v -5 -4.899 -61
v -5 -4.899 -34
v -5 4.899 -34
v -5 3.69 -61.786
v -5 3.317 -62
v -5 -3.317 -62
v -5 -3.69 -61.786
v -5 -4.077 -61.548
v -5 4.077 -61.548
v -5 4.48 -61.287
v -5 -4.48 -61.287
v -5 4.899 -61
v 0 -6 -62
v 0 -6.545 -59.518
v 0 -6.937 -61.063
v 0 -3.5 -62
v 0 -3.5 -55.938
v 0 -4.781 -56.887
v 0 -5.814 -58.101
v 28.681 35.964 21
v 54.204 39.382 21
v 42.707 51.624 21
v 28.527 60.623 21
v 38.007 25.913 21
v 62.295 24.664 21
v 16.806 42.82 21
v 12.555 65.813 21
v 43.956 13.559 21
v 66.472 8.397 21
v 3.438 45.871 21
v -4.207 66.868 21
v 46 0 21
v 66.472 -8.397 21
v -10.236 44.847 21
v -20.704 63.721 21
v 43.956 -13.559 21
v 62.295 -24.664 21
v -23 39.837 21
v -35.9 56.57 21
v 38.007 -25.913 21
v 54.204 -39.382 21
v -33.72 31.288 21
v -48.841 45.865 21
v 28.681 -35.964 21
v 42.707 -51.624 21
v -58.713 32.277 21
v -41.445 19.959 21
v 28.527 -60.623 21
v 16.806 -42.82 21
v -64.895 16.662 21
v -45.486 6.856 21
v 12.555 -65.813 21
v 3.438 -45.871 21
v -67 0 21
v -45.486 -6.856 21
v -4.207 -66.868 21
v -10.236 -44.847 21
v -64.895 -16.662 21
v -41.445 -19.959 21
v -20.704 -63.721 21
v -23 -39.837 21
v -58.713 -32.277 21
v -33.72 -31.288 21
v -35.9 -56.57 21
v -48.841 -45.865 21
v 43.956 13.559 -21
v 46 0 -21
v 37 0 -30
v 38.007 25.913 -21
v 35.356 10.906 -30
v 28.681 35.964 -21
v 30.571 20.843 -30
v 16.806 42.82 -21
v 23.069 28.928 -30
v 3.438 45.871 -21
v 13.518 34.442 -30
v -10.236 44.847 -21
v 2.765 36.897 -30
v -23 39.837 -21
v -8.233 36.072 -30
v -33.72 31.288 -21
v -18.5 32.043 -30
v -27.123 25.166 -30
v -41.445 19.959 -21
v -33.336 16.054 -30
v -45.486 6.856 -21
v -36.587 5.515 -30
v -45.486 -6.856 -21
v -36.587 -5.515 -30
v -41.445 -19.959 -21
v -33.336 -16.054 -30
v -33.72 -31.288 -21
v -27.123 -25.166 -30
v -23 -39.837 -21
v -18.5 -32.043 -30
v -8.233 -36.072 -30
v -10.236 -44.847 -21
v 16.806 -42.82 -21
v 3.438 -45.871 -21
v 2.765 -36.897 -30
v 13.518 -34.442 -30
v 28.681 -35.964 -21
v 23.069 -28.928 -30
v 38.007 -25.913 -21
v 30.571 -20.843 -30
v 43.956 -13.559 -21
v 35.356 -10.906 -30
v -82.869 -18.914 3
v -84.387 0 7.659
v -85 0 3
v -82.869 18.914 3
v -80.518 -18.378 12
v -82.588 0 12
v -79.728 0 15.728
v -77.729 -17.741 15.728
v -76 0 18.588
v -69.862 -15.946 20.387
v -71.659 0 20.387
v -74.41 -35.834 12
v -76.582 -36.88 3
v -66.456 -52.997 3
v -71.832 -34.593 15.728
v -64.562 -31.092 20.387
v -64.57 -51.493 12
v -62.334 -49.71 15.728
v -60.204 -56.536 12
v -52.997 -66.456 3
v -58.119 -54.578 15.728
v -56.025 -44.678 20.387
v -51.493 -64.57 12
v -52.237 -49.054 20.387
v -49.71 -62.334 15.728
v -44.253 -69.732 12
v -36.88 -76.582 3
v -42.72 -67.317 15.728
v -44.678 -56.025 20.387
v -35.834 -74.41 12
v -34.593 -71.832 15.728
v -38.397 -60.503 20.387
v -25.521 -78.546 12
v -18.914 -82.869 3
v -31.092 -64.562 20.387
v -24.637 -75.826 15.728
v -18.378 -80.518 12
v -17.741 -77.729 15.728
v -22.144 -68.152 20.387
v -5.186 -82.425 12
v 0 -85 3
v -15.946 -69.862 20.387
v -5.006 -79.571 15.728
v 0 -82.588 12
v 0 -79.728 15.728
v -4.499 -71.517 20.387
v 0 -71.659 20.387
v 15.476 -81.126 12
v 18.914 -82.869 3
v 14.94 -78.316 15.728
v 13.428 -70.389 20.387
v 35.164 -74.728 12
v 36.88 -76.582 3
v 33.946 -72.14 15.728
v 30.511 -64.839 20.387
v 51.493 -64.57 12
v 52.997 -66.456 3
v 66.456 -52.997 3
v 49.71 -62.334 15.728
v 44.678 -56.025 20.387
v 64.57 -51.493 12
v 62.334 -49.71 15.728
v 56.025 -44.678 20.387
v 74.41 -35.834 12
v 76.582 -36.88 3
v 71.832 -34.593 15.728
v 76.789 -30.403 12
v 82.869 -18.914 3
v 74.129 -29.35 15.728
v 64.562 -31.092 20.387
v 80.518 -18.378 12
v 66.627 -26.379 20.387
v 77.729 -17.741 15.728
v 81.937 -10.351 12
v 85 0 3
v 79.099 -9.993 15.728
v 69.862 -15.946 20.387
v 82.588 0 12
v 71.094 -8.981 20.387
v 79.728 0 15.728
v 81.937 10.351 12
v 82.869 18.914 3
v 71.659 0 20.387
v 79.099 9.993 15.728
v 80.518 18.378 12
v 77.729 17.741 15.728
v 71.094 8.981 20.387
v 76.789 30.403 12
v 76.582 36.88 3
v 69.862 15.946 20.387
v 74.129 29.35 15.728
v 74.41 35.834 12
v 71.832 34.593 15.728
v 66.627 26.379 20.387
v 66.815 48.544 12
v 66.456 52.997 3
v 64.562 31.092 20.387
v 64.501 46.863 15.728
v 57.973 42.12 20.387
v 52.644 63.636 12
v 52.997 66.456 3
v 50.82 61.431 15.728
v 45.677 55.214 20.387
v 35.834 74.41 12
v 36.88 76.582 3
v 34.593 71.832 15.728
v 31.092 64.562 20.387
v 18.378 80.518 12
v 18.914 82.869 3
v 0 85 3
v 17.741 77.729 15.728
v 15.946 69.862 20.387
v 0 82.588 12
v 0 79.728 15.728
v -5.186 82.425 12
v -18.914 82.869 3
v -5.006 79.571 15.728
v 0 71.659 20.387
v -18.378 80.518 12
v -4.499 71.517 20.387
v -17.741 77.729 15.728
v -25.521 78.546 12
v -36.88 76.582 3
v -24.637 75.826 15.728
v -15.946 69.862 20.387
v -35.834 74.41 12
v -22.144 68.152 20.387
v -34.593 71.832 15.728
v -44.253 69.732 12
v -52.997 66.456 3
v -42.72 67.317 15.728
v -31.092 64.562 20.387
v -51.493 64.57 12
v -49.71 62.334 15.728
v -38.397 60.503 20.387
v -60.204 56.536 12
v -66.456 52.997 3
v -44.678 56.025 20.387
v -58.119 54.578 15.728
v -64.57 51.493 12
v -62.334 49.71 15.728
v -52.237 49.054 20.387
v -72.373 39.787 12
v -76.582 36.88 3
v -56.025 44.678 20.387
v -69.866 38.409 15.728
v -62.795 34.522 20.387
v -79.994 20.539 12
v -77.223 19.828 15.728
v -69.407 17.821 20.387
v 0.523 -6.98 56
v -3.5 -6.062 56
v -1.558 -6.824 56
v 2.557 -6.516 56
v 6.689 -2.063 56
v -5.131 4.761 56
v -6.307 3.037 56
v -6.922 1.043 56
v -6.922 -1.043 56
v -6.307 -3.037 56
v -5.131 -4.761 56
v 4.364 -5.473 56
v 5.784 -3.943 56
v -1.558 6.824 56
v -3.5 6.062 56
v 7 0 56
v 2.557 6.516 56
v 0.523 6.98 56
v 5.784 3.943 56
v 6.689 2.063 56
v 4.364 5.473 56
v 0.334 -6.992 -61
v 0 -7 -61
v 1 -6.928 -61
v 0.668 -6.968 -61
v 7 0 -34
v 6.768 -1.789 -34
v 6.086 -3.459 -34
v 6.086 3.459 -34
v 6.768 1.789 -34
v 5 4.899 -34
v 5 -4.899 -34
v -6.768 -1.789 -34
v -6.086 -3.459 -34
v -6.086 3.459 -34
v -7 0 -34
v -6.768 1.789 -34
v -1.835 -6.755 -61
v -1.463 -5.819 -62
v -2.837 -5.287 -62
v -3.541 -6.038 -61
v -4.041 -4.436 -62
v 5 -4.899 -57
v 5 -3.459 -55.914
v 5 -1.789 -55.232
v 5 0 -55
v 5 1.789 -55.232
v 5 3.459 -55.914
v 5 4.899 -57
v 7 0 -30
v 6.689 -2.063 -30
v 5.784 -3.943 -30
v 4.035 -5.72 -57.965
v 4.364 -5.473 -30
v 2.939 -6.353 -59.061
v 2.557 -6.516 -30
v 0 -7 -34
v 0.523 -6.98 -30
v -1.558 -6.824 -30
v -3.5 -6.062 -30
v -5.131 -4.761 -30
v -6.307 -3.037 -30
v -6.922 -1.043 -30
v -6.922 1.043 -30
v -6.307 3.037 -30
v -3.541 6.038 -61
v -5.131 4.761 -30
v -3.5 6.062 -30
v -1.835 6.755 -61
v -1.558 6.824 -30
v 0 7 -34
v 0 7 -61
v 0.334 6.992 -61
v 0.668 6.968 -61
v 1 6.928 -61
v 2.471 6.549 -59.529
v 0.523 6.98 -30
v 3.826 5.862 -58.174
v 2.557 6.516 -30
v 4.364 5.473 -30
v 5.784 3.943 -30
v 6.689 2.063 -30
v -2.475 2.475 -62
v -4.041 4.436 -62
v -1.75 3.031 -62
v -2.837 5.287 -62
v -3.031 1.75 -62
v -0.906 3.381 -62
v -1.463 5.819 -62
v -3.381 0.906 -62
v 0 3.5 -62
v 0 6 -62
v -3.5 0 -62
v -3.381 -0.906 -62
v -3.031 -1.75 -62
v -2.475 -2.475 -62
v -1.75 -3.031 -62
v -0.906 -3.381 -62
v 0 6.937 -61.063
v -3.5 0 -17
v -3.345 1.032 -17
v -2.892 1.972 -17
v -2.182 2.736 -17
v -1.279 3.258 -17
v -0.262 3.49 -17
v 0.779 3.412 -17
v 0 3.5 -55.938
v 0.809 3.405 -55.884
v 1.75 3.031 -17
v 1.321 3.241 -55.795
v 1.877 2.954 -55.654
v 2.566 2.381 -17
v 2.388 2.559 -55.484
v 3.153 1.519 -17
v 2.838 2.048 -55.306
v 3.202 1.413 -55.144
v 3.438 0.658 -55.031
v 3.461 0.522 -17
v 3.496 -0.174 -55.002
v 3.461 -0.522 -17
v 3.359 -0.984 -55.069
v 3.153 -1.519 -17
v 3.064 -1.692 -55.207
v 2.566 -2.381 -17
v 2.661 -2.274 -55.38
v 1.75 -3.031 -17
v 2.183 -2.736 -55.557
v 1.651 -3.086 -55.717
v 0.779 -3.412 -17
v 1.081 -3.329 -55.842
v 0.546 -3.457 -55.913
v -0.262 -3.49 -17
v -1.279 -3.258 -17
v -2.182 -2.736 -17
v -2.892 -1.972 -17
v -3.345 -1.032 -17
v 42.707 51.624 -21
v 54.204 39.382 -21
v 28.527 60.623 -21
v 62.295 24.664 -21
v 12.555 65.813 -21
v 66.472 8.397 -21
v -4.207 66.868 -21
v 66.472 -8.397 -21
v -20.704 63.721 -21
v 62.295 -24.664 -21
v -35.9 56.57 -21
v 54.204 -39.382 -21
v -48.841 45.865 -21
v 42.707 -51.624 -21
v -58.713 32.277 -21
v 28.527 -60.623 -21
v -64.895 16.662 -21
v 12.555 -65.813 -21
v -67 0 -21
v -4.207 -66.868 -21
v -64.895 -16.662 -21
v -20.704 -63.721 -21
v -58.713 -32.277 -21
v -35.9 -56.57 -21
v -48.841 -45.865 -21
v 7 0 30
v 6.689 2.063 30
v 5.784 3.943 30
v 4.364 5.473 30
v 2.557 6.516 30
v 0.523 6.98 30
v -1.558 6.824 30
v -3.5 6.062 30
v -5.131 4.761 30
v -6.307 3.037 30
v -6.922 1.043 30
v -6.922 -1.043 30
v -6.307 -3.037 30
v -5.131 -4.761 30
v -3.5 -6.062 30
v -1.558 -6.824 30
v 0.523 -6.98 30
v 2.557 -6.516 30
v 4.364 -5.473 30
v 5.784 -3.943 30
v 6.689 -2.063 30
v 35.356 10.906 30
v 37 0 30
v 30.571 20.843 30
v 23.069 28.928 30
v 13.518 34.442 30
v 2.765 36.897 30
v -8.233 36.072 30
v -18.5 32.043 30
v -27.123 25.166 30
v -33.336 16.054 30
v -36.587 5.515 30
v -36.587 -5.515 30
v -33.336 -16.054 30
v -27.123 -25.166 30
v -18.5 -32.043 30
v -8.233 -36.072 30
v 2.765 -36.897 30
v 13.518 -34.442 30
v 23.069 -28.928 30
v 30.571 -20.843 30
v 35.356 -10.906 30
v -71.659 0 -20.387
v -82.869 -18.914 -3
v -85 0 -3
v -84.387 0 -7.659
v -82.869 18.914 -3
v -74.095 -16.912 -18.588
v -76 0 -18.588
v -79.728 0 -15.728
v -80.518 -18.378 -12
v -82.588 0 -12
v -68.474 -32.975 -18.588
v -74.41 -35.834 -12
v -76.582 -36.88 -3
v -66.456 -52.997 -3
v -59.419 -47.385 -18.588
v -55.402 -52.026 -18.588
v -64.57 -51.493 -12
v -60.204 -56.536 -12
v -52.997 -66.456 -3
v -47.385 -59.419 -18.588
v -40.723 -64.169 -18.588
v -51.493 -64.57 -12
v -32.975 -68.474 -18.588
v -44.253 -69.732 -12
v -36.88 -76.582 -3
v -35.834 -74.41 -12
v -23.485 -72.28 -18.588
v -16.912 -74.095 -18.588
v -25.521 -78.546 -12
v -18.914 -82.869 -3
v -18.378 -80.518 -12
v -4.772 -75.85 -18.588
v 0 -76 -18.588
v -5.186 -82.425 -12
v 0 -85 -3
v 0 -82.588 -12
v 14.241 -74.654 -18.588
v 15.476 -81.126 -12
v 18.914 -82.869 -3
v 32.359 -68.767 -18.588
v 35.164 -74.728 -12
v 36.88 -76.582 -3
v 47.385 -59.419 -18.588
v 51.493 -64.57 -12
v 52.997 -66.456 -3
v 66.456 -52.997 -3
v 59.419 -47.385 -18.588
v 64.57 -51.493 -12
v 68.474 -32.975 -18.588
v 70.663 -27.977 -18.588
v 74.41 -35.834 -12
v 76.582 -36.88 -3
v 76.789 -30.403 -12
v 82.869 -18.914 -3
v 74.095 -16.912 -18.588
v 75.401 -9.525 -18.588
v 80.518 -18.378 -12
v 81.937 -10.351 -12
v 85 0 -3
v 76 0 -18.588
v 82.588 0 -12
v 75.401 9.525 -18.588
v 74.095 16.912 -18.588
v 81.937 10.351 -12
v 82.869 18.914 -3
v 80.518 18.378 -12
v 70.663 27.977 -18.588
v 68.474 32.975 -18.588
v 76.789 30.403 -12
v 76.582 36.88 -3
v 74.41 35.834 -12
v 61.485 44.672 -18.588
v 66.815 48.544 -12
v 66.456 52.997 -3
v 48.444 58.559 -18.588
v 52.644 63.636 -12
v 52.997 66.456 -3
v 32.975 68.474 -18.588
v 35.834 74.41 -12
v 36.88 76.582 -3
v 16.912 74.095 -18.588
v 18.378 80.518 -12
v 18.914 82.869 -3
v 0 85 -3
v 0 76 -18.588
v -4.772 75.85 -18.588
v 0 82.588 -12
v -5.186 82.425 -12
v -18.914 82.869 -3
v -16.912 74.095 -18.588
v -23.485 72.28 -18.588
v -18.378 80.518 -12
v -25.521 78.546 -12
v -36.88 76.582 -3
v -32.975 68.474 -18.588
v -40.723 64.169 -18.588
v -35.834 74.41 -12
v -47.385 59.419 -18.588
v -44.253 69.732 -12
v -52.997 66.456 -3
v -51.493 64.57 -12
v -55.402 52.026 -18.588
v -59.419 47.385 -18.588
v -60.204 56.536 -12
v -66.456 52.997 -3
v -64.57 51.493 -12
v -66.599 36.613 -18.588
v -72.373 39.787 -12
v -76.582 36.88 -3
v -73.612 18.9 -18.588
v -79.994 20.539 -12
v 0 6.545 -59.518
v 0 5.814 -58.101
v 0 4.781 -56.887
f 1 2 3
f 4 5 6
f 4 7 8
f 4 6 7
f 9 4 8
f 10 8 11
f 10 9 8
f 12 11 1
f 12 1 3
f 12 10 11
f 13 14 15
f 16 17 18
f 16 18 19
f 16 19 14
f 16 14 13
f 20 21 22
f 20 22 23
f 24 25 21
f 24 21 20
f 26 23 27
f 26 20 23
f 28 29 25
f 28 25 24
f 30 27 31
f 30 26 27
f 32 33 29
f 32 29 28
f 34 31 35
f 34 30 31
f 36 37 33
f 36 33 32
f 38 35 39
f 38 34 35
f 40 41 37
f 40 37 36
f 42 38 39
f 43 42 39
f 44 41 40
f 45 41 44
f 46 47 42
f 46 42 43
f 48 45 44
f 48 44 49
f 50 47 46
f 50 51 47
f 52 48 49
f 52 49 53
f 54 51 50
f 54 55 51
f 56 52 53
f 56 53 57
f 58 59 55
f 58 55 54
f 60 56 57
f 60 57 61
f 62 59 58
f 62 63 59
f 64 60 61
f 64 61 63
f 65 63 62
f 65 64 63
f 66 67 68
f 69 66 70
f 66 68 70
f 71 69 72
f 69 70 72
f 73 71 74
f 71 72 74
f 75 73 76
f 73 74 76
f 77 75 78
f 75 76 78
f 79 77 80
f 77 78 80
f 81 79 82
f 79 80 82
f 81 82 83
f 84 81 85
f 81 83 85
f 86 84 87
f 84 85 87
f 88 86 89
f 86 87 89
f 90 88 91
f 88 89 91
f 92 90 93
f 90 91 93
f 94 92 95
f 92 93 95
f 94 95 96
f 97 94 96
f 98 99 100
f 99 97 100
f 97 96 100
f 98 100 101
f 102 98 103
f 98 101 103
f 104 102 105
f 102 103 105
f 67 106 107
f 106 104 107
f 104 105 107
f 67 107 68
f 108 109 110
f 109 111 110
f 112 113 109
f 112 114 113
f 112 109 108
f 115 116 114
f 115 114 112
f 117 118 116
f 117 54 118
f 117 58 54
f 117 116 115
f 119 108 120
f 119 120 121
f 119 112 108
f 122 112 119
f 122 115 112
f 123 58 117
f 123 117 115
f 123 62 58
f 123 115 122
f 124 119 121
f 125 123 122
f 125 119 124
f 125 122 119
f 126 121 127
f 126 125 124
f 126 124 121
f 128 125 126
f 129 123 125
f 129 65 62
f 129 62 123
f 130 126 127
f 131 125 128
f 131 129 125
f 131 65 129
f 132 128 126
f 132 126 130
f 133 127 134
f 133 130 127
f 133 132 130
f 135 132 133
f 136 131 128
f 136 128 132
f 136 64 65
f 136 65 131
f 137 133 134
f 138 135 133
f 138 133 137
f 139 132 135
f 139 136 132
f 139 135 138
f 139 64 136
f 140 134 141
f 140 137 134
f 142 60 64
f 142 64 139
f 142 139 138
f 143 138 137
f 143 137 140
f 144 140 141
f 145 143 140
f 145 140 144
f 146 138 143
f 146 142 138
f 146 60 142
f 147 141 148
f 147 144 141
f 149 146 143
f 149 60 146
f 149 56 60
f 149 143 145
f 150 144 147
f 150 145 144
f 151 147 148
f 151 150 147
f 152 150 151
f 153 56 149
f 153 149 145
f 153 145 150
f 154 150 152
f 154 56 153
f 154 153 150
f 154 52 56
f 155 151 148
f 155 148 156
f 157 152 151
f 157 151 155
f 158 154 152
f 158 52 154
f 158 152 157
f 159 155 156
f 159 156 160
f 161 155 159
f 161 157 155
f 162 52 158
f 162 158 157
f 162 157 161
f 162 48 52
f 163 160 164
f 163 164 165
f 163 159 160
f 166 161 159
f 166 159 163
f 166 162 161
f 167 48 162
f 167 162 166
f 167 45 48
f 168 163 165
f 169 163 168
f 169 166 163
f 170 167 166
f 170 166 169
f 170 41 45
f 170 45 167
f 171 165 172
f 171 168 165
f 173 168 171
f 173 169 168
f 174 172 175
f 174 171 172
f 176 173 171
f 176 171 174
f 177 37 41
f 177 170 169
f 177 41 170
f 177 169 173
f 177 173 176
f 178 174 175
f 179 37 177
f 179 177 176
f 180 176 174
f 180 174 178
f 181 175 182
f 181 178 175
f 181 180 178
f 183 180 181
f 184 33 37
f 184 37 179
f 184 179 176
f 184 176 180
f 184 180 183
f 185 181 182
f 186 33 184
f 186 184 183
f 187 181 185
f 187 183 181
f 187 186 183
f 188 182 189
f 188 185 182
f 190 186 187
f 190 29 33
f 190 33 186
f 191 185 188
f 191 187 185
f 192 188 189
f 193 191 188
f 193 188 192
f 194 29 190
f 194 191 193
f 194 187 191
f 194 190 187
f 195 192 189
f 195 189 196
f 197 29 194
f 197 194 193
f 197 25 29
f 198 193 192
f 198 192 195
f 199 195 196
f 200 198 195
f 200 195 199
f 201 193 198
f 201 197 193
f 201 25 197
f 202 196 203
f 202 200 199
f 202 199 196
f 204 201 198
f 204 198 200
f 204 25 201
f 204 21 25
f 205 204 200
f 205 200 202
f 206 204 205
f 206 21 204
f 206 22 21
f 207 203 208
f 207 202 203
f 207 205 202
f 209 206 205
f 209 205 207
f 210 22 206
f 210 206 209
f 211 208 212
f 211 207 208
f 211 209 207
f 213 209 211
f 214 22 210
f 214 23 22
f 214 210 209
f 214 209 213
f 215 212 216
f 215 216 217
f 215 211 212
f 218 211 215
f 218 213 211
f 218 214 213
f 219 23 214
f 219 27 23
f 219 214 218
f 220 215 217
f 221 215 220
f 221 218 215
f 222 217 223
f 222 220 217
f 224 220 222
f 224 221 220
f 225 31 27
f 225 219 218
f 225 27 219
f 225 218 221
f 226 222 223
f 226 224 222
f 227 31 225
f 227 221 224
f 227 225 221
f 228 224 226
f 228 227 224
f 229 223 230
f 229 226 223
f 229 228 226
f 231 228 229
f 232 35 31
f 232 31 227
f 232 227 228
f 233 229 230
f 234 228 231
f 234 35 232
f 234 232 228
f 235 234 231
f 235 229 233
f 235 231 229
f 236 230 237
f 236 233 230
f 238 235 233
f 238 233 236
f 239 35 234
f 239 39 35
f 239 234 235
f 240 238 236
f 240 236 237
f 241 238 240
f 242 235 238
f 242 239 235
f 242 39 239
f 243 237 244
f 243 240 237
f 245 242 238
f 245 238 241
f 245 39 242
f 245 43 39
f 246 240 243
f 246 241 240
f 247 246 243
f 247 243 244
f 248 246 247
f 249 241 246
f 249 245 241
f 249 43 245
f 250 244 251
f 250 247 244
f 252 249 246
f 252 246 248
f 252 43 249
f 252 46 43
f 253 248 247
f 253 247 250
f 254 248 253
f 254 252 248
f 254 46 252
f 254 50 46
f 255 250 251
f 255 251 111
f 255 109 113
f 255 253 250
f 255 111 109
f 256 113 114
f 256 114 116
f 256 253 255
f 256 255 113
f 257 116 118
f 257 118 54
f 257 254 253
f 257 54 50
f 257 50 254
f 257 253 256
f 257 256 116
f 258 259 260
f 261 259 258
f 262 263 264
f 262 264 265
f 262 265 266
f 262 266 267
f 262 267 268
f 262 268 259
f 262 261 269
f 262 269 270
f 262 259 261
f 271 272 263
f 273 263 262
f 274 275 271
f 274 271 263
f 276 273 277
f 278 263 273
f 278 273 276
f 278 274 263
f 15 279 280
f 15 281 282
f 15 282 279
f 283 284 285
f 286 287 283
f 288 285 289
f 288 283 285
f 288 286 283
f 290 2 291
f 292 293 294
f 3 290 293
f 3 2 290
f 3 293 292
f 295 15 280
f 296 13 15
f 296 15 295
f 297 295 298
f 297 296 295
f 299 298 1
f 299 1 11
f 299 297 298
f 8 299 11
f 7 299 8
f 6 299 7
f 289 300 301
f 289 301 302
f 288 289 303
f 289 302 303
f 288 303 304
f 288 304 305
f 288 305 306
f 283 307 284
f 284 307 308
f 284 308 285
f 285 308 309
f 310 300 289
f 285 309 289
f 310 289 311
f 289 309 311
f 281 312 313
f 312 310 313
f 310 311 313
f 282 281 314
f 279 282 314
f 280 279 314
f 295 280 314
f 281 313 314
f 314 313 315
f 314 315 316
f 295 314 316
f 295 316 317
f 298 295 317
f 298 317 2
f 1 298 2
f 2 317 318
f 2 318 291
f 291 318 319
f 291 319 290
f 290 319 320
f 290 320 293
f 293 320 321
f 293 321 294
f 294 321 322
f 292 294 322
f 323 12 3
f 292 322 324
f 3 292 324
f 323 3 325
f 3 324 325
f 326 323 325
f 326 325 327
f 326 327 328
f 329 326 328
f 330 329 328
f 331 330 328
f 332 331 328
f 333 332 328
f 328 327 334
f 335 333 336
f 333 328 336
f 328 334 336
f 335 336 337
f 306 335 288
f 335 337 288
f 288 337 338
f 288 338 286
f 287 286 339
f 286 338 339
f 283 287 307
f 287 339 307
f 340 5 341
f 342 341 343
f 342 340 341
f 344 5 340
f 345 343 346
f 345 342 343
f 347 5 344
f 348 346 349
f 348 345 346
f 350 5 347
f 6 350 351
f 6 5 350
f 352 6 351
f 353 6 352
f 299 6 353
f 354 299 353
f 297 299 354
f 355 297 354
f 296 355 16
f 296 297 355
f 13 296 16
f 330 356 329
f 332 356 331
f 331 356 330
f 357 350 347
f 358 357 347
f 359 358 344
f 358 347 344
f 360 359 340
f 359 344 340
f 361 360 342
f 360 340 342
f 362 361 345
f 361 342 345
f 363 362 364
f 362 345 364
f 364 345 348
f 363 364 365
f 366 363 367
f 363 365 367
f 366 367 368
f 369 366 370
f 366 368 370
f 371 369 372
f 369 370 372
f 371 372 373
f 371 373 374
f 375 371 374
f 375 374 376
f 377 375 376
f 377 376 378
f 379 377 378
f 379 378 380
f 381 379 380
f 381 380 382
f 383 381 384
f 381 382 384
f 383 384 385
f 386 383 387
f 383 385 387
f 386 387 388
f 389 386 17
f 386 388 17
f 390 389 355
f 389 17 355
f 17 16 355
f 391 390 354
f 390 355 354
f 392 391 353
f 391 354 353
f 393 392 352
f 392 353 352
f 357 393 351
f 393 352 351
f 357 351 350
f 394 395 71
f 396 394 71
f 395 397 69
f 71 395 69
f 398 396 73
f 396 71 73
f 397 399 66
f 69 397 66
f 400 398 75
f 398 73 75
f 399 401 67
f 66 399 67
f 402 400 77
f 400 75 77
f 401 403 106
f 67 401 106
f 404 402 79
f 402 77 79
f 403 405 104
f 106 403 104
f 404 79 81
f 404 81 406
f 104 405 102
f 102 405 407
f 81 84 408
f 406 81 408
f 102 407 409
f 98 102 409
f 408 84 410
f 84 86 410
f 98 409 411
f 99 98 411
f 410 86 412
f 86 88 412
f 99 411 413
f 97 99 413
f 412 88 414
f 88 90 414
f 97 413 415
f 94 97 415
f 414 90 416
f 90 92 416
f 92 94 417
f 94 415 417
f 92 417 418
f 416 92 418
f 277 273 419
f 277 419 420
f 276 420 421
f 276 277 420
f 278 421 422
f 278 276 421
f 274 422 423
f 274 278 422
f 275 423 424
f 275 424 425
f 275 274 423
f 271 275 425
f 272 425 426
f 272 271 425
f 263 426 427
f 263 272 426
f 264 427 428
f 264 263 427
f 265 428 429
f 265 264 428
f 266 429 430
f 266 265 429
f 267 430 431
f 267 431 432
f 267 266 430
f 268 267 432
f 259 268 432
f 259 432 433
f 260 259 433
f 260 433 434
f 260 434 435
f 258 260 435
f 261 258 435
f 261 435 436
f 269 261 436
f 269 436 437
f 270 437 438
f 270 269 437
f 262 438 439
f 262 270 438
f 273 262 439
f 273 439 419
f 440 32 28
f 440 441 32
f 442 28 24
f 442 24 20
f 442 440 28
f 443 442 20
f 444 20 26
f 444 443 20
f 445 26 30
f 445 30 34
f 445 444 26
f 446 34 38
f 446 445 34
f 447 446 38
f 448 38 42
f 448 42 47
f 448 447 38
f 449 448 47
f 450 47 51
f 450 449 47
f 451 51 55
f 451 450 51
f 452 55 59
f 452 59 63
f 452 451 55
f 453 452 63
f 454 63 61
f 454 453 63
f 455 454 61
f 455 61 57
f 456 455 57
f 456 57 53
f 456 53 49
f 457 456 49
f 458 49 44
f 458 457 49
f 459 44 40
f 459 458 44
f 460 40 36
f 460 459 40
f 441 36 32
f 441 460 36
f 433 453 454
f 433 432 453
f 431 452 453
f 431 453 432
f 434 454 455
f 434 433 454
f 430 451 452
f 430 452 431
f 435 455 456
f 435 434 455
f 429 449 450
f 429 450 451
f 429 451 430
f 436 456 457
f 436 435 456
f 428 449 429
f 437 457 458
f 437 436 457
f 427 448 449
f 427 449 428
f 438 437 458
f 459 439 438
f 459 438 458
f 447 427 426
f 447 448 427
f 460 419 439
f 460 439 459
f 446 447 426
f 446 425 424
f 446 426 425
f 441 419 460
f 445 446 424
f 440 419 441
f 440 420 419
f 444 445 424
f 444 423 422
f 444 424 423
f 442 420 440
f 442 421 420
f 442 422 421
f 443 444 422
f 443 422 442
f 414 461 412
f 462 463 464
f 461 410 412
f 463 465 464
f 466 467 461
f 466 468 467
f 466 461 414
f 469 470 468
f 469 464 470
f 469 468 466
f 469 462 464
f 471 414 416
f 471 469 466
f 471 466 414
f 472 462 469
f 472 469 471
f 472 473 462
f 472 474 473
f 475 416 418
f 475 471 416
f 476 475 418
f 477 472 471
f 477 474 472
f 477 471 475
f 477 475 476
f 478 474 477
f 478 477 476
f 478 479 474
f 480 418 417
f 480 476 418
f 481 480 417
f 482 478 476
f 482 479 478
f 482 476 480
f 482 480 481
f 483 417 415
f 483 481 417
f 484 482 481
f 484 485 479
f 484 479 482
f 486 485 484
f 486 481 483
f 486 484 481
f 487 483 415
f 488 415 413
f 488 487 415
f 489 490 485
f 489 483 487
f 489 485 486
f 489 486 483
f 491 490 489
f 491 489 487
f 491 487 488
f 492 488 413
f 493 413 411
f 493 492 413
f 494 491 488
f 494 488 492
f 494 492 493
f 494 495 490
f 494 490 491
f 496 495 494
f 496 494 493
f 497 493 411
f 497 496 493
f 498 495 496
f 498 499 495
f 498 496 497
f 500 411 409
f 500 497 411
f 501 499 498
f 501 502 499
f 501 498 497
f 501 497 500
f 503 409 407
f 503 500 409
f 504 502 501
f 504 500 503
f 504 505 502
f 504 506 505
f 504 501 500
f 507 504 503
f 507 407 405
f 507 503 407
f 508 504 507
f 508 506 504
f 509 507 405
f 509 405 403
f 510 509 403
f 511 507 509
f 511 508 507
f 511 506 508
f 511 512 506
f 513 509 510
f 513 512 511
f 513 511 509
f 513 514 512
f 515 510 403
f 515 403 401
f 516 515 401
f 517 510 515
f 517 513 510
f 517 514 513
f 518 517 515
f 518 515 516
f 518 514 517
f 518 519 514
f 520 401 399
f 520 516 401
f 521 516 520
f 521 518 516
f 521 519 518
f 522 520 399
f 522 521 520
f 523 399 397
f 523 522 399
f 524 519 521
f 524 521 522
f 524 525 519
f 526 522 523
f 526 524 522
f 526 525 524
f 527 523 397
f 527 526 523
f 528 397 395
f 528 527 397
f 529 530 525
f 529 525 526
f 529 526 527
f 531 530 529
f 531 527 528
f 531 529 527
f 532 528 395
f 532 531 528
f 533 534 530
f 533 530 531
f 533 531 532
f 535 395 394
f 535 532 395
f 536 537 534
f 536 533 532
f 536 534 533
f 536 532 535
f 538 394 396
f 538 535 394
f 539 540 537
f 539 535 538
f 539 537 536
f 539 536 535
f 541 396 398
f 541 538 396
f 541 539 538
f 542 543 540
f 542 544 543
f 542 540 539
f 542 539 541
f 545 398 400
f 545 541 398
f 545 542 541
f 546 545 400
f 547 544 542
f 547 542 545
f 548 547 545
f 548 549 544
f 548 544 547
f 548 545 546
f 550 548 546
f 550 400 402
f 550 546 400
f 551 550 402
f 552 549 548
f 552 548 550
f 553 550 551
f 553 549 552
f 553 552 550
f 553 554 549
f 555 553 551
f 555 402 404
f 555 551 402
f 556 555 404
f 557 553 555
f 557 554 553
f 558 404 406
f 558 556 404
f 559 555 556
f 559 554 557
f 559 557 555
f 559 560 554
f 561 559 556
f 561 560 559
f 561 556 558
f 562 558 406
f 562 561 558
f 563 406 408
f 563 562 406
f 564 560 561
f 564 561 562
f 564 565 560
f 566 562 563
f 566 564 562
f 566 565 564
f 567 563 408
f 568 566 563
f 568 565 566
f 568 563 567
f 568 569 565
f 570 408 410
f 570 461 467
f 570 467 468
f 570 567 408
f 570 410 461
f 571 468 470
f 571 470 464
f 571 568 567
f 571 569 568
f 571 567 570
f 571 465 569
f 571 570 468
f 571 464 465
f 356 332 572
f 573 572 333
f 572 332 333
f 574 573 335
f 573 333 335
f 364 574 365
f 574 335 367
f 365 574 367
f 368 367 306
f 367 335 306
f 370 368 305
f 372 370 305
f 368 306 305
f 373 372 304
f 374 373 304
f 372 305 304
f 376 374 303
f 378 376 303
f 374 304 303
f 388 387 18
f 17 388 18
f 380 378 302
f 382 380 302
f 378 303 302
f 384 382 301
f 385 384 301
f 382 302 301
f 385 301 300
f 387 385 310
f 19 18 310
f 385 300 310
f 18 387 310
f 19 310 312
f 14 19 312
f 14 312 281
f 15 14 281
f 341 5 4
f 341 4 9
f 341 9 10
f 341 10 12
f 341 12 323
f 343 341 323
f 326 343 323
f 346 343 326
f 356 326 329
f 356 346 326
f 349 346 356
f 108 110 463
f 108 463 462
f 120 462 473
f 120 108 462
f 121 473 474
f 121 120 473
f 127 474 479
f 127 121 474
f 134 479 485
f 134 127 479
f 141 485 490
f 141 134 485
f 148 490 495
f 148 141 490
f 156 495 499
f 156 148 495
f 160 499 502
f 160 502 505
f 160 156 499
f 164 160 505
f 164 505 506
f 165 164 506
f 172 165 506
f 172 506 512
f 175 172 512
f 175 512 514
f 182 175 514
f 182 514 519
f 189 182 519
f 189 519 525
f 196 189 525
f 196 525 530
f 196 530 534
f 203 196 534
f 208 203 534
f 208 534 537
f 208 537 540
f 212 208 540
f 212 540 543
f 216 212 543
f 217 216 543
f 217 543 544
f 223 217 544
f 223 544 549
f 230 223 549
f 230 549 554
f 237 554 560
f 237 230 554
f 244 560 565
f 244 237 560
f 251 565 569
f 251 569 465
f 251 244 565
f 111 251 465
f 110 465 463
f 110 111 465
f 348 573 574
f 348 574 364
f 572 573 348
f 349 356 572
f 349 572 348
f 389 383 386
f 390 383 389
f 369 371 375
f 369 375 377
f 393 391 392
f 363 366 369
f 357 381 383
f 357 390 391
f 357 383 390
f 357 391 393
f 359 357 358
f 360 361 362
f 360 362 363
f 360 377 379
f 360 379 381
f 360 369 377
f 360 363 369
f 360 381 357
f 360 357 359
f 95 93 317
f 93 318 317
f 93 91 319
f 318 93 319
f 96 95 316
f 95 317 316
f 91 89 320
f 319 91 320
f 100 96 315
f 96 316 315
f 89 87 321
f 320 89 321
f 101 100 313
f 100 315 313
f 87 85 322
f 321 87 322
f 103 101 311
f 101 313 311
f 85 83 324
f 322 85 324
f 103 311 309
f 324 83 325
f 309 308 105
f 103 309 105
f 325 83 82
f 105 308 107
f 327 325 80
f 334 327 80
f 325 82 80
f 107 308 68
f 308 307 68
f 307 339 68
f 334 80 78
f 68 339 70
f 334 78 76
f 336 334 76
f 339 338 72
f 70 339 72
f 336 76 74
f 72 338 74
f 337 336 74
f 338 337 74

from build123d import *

# Parameters (mm, degrees)
SKETCH_1_R           = 85
EXTRUDE_1_DEPTH      = 21
SKETCH_2_R           = 47
EXTRUDE_2_DEPTH      = 30
CHAMFER_1_SIZE       = 10
SKETCH_3_R           = 7
EXTRUDE_3_DEPTH      = 32
SKETCH_5_OUTSIDE_W   = 223.484
SKETCH_5_OUTSIDE_H   = 223.484
SKETCH_5_OUTSIDE_W_2 = 10
SKETCH_5_OUTSIDE_H_2 = 14
CUT_EXTRUDE_1_DEPTH  = 28
CHAMFER_3_SIZE       = 1
SKETCH_7_R           = 3.5
CUT_EXTRUDE_2_DEPTH  = 45
SKETCH_8_R           = 7
CUT_EXTRUDE_4_DEPTH  = 5
FILLET_1_R           = 18
EXTRUDE_START        = 26
SKETCH_10_R          = 7
EXTRUDE_4_DEPTH      = 26


with BuildPart() as part:
    # 草图1 → 凸台-拉伸1 (new, symmetric)
    with BuildSketch(Plane.XY):
        with Locations(Location((0, 0, 0), (0, 0, 180))):
            Circle(SKETCH_1_R)
    extrude(amount=EXTRUDE_1_DEPTH, both=True)

    # 草图2 → 凸台-拉伸2 (add, symmetric)
    with BuildSketch(Plane.XY):
        Circle(SKETCH_2_R)
    extrude(amount=EXTRUDE_2_DEPTH, both=True)

    # 倒角1
    # the kernel refuses this chamfer: 10 mm, written as the material it takes off along each edge
    with BuildSketch(Plane(origin=(0, 0, -30), x_dir=(1, 0, 0), z_dir=(0, -1, 0))) as chamfer_1_piece_1_section:
        Polygon((47, CHAMFER_1_SIZE), (47 - CHAMFER_1_SIZE, 0), (47, 0), align=None)
    chamfer_1_piece_1 = revolve(axis=Axis((0, 0, -30), (0, 0, 1)), mode=Mode.PRIVATE)
    chamfer_1_piece_1 = split(chamfer_1_piece_1, bisect_by=Plane(origin=(-41.532222796, 0, -21), z_dir=(0, 0, -1)), keep=Keep.TOP, mode=Mode.PRIVATE)
    add(chamfer_1_piece_1, mode=Mode.SUBTRACT)
    with BuildSketch(Plane(origin=(0, 0, 30), x_dir=(1, 0, 0), z_dir=(0, -1, 0))) as chamfer_1_piece_2_section:
        Polygon((47, -CHAMFER_1_SIZE), (47 - CHAMFER_1_SIZE, 0), (47, 0), align=None)
    chamfer_1_piece_2 = revolve(axis=Axis((0, 0, 30), (0, 0, 1)), mode=Mode.PRIVATE)
    chamfer_1_piece_2 = split(chamfer_1_piece_2, bisect_by=Plane(origin=(-41.532222796, 0, 21), z_dir=(0, 0, 1)), keep=Keep.TOP, mode=Mode.PRIVATE)
    add(chamfer_1_piece_2, mode=Mode.SUBTRACT)

    # 草图3 → 凸台-拉伸3 (add)
    with BuildSketch(Plane(origin=(0, 0, -30), x_dir=(-1, 0, 0), z_dir=(0, 0, -1))):
        with Locations(Location((0, 0, 0), (0, 0, 180))):
            Circle(SKETCH_3_R)
    extrude(amount=EXTRUDE_3_DEPTH)

    # 草图5 outside → 切除-拉伸1 (cut)
    with BuildSketch(Plane(origin=(0, 0, -62), x_dir=(-1, 0, 0), z_dir=(0, 0, -1))):
        Rectangle(SKETCH_5_OUTSIDE_W, SKETCH_5_OUTSIDE_H)
        Rectangle(SKETCH_5_OUTSIDE_W_2, SKETCH_5_OUTSIDE_H_2, mode=Mode.SUBTRACT)
    extrude(amount=-CUT_EXTRUDE_1_DEPTH, mode=Mode.SUBTRACT)

    # 倒角3
    # the kernel refuses this chamfer: 1 mm, written as the material it takes off along each edge
    with BuildSketch(Plane(origin=(0, 0, -62), x_dir=(-0.9180065533872216, 0.39656521271805273, 0), z_dir=(-0.39656521271805273, -0.9180065533872216, 0))) as chamfer_3_piece_1:
        Polygon((7, -CHAMFER_3_SIZE), (7 - CHAMFER_3_SIZE, 0), (7, 0), align=None)
    revolve(axis=Axis((0, 0, -62), (0, 0, -1)), revolution_arc=66.636371816, mode=Mode.SUBTRACT)
    with BuildSketch(Plane(origin=(0, 0, -62), x_dir=(0.9180065533873013, -0.3965652127178682, 0), z_dir=(0.3965652127178682, 0.9180065533873013, 0))) as chamfer_3_piece_2:
        Polygon((7, -CHAMFER_3_SIZE), (7 - CHAMFER_3_SIZE, 0), (7, 0), align=None)
    revolve(axis=Axis((0, 0, -62), (0, 0, -1)), revolution_arc=66.636371927, mode=Mode.SUBTRACT)
    with BuildSketch(Plane(origin=(0, 0, -62), x_dir=(-1.935452947399645e-09, -1.0, 0), z_dir=(1.0, -1.935452947399645e-09, 0))) as chamfer_3_piece_3:
        Polygon((7, -CHAMFER_3_SIZE), (7 - CHAMFER_3_SIZE, 0), (7, 0), align=None)
    revolve(axis=Axis((0, 0, -62), (0, 0, -1)), revolution_arc=66.636371706, mode=Mode.SUBTRACT)
    with BuildSketch(Plane(origin=(0, 0, -62), x_dir=(0, 1, 0), z_dir=(-1, 0, 0))) as chamfer_3_piece_4:
        Polygon((7, -CHAMFER_3_SIZE), (7 - CHAMFER_3_SIZE, 0), (7, 0), align=None)
    revolve(axis=Axis((0, 0, -62), (0, 0, -1)), revolution_arc=66.636371816, mode=Mode.SUBTRACT)

    # 草图7 → 切除-拉伸2 (cut)
    with BuildSketch(Plane(origin=(0, 0, -62), x_dir=(-1, 0, 0), z_dir=(0, 0, -1))):
        Circle(SKETCH_7_R)
    extrude(amount=-CUT_EXTRUDE_2_DEPTH, mode=Mode.SUBTRACT)

    # 草图8 → 切除-拉伸4 (cut)
    with BuildSketch(Plane(origin=(5, 0, 0), x_dir=(0, 0, -1), z_dir=(1, 0, 0))):
        with Locations((62, 0)):
            Circle(SKETCH_8_R)
    extrude(amount=-CUT_EXTRUDE_4_DEPTH, mode=Mode.SUBTRACT)

    # 圆角1
    fillet_1_edges = [part.edges().sort_by_distance(p)[0] for p in [
        (85, 0, -21),
        (85, 0, 21),
    ]]
    fillet(fillet_1_edges, radius=FILLET_1_R)

    # 草图10 → 凸台-拉伸4 (add)
    with BuildSketch(Plane.XY.offset(30).offset(EXTRUDE_START)):
        Circle(SKETCH_10_R)
    extrude(amount=-EXTRUDE_4_DEPTH)


solid = part.part
